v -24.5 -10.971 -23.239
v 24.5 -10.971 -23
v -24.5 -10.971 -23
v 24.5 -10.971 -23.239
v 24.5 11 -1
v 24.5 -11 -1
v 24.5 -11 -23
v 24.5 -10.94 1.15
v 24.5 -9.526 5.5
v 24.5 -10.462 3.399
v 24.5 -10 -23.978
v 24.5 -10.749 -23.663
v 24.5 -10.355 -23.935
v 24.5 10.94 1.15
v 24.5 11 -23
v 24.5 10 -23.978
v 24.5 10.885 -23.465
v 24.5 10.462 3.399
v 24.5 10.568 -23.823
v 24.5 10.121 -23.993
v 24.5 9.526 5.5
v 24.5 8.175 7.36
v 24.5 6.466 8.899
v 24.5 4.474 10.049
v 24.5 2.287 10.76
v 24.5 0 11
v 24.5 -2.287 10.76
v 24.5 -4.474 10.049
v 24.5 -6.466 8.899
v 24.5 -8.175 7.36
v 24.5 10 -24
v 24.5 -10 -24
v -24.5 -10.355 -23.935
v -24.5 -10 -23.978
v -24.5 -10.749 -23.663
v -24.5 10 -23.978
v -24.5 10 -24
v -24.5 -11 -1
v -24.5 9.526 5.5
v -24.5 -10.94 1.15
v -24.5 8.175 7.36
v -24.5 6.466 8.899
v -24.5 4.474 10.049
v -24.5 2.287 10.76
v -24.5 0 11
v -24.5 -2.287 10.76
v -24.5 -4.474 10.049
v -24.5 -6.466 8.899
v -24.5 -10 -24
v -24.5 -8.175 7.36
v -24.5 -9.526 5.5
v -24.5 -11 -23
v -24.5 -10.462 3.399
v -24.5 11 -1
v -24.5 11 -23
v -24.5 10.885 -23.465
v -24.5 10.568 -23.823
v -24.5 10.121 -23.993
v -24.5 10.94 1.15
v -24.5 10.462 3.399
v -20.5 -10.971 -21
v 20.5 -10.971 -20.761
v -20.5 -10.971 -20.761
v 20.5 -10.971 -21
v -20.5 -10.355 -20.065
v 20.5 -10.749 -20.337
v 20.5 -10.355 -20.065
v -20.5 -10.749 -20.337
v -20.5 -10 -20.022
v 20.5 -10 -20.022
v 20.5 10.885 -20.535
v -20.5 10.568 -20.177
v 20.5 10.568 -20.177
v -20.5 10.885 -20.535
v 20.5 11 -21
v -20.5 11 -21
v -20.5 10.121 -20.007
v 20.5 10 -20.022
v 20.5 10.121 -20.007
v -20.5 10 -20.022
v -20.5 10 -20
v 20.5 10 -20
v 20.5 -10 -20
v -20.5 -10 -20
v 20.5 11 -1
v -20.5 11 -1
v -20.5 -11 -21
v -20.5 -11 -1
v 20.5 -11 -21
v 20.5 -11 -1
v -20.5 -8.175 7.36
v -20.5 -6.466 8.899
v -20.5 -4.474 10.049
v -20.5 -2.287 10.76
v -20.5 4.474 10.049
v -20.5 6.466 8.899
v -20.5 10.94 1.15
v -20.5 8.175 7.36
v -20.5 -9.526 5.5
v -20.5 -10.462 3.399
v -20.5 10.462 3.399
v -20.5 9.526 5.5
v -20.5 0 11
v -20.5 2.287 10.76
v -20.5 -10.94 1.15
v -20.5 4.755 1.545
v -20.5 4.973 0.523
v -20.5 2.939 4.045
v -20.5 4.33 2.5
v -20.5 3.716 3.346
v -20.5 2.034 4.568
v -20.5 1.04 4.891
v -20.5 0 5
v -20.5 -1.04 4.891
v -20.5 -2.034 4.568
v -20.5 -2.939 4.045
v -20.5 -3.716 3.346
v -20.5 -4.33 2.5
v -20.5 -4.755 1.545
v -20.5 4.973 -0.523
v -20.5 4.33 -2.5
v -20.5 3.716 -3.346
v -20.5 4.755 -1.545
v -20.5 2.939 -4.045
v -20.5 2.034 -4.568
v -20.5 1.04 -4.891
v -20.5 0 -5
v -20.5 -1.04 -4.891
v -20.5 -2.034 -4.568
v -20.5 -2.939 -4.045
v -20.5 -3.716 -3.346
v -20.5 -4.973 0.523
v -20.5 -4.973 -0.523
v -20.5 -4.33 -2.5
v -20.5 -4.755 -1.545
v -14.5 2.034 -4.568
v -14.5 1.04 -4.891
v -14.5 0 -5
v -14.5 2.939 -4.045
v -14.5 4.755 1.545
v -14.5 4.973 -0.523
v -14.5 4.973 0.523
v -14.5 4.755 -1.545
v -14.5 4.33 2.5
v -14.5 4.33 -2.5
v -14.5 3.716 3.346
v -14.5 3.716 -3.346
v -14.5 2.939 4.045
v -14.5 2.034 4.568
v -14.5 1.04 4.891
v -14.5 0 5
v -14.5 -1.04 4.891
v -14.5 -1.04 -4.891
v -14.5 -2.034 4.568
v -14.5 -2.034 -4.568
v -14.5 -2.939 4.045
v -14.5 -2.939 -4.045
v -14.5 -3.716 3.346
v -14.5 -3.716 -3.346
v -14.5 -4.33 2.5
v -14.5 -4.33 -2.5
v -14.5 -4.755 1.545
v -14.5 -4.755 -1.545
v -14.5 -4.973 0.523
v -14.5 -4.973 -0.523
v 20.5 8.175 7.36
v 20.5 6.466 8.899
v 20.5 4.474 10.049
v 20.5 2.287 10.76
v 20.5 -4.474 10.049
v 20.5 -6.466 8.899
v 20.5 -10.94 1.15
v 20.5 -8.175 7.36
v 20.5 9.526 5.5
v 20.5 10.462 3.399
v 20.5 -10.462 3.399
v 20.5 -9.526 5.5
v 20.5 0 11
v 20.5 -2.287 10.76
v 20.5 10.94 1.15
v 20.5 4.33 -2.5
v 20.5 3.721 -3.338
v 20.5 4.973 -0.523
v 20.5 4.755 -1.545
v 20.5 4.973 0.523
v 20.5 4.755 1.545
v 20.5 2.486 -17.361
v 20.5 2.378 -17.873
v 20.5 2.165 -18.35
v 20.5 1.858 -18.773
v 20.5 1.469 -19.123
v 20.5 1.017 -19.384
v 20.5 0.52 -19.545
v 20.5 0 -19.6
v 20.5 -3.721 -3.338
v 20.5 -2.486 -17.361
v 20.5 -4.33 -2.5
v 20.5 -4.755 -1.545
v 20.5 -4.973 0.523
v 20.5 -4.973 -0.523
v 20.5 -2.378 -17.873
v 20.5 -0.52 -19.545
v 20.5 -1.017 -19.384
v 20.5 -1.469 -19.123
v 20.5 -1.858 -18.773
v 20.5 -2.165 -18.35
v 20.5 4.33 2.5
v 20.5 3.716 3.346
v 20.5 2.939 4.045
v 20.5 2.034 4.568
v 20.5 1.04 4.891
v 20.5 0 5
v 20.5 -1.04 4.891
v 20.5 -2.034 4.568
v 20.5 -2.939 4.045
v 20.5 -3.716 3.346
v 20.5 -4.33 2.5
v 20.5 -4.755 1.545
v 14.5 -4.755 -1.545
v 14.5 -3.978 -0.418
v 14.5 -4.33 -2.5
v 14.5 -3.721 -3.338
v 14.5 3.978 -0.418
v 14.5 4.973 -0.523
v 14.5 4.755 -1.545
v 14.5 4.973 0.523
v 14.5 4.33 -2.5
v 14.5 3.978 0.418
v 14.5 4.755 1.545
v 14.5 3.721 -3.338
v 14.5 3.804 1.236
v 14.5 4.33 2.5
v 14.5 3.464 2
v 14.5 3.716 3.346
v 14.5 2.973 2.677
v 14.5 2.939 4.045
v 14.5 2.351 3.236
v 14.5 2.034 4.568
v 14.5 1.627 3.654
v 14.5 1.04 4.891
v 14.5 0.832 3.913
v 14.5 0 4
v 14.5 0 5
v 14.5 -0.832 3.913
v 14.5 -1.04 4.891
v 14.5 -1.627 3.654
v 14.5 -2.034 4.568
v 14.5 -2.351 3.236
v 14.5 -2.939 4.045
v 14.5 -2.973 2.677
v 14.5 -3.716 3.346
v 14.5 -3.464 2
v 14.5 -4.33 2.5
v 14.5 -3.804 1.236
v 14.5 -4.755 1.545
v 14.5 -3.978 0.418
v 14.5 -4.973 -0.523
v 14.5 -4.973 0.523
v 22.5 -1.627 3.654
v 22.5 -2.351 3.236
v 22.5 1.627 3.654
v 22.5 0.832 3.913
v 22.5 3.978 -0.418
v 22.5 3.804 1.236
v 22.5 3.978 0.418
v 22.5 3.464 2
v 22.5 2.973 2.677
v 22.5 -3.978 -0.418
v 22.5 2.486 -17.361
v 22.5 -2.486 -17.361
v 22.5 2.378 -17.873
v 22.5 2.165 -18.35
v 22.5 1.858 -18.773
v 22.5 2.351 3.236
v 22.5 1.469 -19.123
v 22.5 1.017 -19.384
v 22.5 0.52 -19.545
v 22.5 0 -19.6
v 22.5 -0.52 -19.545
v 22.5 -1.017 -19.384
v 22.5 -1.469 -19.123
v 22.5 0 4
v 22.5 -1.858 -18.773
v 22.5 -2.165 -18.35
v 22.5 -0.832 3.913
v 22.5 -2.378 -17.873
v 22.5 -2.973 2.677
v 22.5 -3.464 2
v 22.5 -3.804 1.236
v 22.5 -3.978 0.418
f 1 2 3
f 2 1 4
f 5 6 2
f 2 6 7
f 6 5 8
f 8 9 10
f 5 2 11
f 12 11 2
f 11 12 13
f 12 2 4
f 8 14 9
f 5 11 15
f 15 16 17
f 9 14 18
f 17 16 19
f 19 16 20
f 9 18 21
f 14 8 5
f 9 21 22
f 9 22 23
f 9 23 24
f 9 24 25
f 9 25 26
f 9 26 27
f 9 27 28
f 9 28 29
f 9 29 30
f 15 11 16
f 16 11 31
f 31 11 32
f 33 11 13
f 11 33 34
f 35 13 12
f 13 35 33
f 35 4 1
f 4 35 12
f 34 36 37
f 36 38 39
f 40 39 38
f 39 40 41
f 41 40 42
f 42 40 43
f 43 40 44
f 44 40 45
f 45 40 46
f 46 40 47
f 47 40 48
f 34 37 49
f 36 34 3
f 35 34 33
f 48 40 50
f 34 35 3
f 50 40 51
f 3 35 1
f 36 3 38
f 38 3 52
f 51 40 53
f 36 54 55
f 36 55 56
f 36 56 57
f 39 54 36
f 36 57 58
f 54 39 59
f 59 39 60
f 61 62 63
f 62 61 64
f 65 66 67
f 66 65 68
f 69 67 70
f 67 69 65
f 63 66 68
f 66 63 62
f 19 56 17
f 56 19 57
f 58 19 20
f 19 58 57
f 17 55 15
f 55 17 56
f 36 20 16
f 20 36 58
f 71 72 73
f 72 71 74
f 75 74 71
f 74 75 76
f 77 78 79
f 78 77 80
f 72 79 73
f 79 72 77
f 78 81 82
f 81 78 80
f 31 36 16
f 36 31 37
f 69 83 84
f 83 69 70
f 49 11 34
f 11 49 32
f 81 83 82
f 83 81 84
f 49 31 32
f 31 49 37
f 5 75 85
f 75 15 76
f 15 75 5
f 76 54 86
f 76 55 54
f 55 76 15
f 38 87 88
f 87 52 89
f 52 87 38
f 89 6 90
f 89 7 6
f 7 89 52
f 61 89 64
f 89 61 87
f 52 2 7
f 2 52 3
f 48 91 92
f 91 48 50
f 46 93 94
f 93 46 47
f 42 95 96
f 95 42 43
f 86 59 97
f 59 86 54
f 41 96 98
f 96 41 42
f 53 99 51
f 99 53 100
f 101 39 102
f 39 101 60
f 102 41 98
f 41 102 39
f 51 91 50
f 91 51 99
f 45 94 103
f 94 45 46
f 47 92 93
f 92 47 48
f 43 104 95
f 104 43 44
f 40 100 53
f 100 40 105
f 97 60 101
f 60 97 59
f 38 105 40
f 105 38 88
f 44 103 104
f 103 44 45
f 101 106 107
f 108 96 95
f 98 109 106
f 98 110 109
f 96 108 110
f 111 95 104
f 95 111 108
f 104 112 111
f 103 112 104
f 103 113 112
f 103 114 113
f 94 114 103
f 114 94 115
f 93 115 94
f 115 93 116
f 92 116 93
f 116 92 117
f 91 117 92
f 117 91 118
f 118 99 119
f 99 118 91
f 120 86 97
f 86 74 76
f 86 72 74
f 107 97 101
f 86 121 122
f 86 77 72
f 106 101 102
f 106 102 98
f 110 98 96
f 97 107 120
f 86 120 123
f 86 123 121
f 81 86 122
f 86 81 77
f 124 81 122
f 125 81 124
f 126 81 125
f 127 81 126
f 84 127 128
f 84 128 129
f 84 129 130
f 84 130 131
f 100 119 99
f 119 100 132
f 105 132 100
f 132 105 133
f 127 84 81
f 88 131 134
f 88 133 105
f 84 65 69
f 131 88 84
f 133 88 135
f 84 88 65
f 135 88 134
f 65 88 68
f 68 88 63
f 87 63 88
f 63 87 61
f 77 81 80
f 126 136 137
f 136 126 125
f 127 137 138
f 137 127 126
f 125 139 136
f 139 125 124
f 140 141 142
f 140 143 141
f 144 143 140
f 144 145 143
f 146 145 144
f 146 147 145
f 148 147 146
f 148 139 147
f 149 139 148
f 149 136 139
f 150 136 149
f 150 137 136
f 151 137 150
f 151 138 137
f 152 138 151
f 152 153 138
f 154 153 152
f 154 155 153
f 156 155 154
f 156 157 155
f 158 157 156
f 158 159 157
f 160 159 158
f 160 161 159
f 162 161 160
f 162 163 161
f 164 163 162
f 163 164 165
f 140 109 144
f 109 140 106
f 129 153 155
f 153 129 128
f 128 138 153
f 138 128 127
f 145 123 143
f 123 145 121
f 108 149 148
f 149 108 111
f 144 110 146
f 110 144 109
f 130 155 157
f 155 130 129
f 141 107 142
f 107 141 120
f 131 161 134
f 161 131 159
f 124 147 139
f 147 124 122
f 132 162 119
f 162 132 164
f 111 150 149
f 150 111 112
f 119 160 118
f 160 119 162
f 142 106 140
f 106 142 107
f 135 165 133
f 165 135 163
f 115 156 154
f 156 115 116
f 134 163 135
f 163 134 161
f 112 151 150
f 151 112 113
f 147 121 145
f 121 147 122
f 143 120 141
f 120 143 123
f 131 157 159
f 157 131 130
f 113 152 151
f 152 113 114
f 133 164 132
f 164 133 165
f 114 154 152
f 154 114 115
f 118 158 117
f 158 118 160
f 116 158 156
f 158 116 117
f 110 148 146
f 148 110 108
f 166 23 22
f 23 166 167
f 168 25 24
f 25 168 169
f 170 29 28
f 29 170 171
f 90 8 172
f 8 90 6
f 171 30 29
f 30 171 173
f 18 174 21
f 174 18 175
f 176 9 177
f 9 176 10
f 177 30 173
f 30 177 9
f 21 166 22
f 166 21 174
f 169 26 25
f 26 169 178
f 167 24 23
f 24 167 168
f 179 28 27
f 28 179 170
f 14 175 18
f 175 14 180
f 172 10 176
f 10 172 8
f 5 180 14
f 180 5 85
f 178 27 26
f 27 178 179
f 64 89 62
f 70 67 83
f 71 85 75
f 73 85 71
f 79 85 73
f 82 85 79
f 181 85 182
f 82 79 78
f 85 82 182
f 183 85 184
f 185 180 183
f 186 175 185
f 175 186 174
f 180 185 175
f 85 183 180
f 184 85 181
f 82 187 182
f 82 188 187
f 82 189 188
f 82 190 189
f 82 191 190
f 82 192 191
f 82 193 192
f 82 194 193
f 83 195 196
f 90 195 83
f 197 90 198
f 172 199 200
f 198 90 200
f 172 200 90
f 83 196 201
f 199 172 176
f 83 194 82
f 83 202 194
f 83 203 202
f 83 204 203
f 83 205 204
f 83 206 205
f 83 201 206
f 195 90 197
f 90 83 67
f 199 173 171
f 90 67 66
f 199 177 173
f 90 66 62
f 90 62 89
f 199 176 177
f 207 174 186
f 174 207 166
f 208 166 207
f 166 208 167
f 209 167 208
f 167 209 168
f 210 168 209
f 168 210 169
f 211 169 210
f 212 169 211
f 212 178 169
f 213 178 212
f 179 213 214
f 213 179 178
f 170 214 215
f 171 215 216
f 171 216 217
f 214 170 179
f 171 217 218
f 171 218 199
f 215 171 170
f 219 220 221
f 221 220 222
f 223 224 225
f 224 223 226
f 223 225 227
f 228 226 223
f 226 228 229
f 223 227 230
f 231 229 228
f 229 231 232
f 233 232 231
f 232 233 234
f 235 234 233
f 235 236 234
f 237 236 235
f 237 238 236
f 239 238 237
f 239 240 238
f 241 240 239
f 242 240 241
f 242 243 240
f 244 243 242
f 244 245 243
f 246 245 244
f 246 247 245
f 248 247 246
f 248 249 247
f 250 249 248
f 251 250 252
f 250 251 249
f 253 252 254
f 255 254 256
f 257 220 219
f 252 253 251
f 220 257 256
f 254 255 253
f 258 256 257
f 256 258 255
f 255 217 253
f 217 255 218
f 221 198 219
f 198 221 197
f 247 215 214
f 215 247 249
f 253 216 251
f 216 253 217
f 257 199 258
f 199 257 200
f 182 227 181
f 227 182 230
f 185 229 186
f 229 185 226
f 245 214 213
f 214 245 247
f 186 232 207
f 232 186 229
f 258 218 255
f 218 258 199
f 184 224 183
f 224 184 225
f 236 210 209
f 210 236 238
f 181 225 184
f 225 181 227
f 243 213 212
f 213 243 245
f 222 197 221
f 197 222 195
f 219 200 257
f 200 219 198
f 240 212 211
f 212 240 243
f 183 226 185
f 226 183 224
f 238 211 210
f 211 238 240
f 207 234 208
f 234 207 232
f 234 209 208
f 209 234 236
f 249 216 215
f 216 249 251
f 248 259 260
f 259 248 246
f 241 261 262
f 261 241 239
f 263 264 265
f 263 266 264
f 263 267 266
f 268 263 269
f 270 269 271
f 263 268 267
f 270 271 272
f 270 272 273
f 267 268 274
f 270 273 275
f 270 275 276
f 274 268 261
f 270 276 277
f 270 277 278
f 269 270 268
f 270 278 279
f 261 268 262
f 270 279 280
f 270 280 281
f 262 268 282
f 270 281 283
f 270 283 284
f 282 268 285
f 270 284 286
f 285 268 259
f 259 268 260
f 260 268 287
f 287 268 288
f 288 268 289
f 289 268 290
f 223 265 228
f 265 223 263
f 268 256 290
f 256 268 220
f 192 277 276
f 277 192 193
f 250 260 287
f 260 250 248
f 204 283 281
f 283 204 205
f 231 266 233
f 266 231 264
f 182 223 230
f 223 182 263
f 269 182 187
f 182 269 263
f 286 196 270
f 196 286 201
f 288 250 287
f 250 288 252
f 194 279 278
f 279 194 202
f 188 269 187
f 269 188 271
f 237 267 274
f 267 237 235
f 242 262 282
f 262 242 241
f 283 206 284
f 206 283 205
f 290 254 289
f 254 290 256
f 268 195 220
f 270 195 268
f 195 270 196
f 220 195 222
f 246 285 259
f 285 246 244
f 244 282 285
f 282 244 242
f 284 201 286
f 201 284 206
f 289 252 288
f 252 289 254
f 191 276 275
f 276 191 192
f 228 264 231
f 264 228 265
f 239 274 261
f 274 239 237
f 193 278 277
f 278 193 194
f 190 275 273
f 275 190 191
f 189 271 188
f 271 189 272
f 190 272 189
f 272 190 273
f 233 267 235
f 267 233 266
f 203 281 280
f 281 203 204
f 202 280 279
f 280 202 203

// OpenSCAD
// file: ../non-printable-components/servo.scad
24g_motor_with_horn();

module 9g_motor(){
	difference(){			
		union(){
			color("blue") cube([23,12.5,22], center=true);
			color("blue") translate([0,0,5]) cube([32,12,2], center=true);
			color("blue") translate([5.5,0,2.75]) cylinder(r=6, h=25.75, $fn=20, center=true);
			color("blue") translate([-.5,0,2.75]) cylinder(r=1, h=25.75, $fn=20, center=true);
			color("blue") translate([-1,0,2.75]) cube([5,5.6,24.5], center=true);		
			color("white") translate([5.5,0,3.65]) cylinder(r=2.35, h=29.25, $fn=20, center=true);				
		}
		translate([10,0,-11]) rotate([0,-30,0]) cube([8,13,4], center=true);
		for ( hole = [14,-14] ){
			translate([hole,0,5]) cylinder(r=2.2, h=4, $fn=20, center=true);
		}	
	}
}

module 24g_motor_horn() {
	color("white"){
        hull(){
            cylinder(h=2, d=8, $fn=20);
            translate([17.1,0,0])
            cylinder(h=2,d=5, $fn=20);
        }
        translate([0,0,-3])
        cylinder(h=5, d=7, $fn=20);
    }
}

module 24g_motor_with_horn(angle){
    24g_motor();
    translate([7.6,0,19.8])
	rotate(angle)
    24g_motor_horn();
}

module 24g_motor(){
	difference(){			
		union(){
			color("black") cube([31.4,16.5,28.6], center=true);
			color("black") translate([0,0,8.55]) cube([42,16,2.5], center=true);
            
            color("black")
            hull() {
			 translate([7.6,0,0]) cylinder(r=8.2, h=15.3, $fn=20);
                translate([3.5,0,7.65])
                cube([8.2,16.4,15.3], center=true);

            }
            color("black")
            translate([-7.6,0,7.65])
                cube([10.5,16.4,15.3], center=true);
		
			color("gold") translate([7.6,0,4.15]) cylinder(r=2.9, h=29.25, $fn=20, center=true);				
		}
		for ( hole = [19,-19] ){
			translate([hole,4,8]) cylinder(r=2.2, h=4, $fn=20, center=true);
            translate([hole,-4,8]) cylinder(r=2.2, h=4, $fn=20, center=true);
		}	
	}
    
    translate([15.7,1.2,-5.2])
    rotate([0,90,0])
    cylinder(r=0.6,h=3,$fn=20);
    color("red")
    translate([15.7,0,-5.2])
    rotate([0,90,0])
    cylinder(r=0.6,h=3,$fn=20);
    color("#604030")
    translate([15.7,-1.2,-5.2])
    rotate([0,90,0])
    cylinder(r=0.6,h=3,$fn=20);
}
// main file
use <../non-printable-components/servo.scad>
use <MCAD/regular_shapes.scad>
use <MCAD/boxes.scad>
$fs = 0.5;
module barrel_joint(diameter, bearing_size) {
        difference() {
                hull() {
                    cylinder(d=diameter, h=38);
                    translate([-diameter/2,0,19])
                    cube([diameter, diameter, 38], center=true);
                }
                translate([0,0,-1])
                cylinder(d=bearing_size,h=6);
                translate([0,0,33])
                cylinder(d=bearing_size,h=6);
                translate([-5.5, 0,17])
                9g_motor();
                hull() {
                    translate([0,0,6])
                    cylinder(r=6,h=27);
                    translate([-20,0,19.6])
                    cube([20,13,28], center=true);
                    
                }
                translate([0,0,22])
                cube([diameter, 12.2, 2.2], center=true);
                translate([-16,0,2])
                rotate([0,-90,0])
                cylinder(d=3,h=8);
                translate([-16,0,36])
                rotate([0,-90,0])
                cylinder(d=3,h=8);
        }
        
}

module barrel_joint_split_9g(diameter, bearing_size, inverse=false) {
    inversion = inverse ? -1 : 1;
    difference() {
         hull() {
            cylinder(d=diameter, h=38);
            translate([-diameter/2,0,19])
            cube([diameter, diameter, 38], center=true);
        }
        translate([0,0,-1])
        cylinder(d=bearing_size,h=6);
        translate([0,0,33])
        cylinder(d=bearing_size,h=6);
        translate([-5.5, 0,17])
        9g_motor();
        hull() {
            translate([0,0,6])
            cylinder(r=6,h=27);
            translate([-20,0,19.6])
            cube([20,13,28], center=true);
            
        }
        translate([0,0,22])
        cube([diameter, 12.2, 2.2], center=true);
        translate([0,20 * inversion,0])
        cube([50,40,80], center=true);
        
        translate([-16,20,2.5])
        rotate([90,0,0])
        cylinder(d=3,h=40);
        translate([-16,20,35.5])
        rotate([90,0,0])
        cylinder(d=3,h=40);
    }
}

module barrel_joint_split_24g(diameter, bearing_size, inverse=false) {
    inversion = inverse ? -1 : 1;
    difference() {
        //main body
         hull() {
            cylinder(d=diameter, h=40);
            translate([-15,0,20])
            cube([30, diameter, 40], center=true);
        }
        // bearings
        translate([0,0,-1])
        cylinder(d=bearing_size,h=6);
        translate([0,0,36])
        cylinder(d=bearing_size,h=6);
        
        //make sure motor fits
        translate([-7.6, 0,20.6])
        24g_motor();
        
        //internal space
        hull() {
            translate([0,0,6])
            cylinder(r=8.3,h=30.01);
            translate([-21,0,21.05])
            cube([20,16.6,30.01], center=true);
            
        }
        //slot
        translate([0,0,29.1])
        cube([diameter, 16, 2.6], center=true);
        
        //for splitting in half
        translate([0,20 * inversion,0])
        cube([65,40,85], center=true);
        
        //bolt holes 
        translate([-16,20,2.5])
        rotate([90,0,0])
        cylinder(d=3,h=40);
        translate([-16,20,37.8])
        rotate([90,0,0])
        cylinder(d=3,h=40);
        
        //for wires
        translate([-10,0,11])
        cube([42,5,11], center=true);
    }
}

module barrel_joint_attachment(diameter, width) {
    //base
     translate([0,0,-22]) {
                rotate([90,0,90])
                roundedBox(size=[diameter,4, width], radius=1, sidesonly=true);
            }
            
            //-ve x side
            translate([-width/2,0,0])
            rotate([0,90,0]){
            hull() {
                translate([diameter/2,0,2])
                roundedBox(size=[diameter,diameter,4],radius=1, sidesonly=true);
                cylinder(d=diameter, h=4);
            }
            cylinder(h=10,r=5);
        }
            //+ve x side
        translate([width/2,0,0])
        rotate([180,90,0]){
        difference(){
            union() {
                hull() {
                    translate([diameter/2,0,2])
                    roundedBox(size=[diameter,diameter,4],radius=1, sidesonly=true);
                    cylinder(d = diameter, h=4);
                }
                cylinder(h=10,r=5);
            }
            
            //for servo horn
            translate([0,0,2])
            hull() {
                cylinder(d=8, h=9);
                translate([17.1,0,0])
                cylinder(d=5,h=9);
            }
        }
    }
}

//barrel_joint_split_24g(24,19);
//translate([-7.6,0,20.6])
//24g_motor_with_horn();
//barrel_joint(22,19);
//translate([-5.5, 0,17])
//9g_motor();

barrel_joint_attachment(22,49);
